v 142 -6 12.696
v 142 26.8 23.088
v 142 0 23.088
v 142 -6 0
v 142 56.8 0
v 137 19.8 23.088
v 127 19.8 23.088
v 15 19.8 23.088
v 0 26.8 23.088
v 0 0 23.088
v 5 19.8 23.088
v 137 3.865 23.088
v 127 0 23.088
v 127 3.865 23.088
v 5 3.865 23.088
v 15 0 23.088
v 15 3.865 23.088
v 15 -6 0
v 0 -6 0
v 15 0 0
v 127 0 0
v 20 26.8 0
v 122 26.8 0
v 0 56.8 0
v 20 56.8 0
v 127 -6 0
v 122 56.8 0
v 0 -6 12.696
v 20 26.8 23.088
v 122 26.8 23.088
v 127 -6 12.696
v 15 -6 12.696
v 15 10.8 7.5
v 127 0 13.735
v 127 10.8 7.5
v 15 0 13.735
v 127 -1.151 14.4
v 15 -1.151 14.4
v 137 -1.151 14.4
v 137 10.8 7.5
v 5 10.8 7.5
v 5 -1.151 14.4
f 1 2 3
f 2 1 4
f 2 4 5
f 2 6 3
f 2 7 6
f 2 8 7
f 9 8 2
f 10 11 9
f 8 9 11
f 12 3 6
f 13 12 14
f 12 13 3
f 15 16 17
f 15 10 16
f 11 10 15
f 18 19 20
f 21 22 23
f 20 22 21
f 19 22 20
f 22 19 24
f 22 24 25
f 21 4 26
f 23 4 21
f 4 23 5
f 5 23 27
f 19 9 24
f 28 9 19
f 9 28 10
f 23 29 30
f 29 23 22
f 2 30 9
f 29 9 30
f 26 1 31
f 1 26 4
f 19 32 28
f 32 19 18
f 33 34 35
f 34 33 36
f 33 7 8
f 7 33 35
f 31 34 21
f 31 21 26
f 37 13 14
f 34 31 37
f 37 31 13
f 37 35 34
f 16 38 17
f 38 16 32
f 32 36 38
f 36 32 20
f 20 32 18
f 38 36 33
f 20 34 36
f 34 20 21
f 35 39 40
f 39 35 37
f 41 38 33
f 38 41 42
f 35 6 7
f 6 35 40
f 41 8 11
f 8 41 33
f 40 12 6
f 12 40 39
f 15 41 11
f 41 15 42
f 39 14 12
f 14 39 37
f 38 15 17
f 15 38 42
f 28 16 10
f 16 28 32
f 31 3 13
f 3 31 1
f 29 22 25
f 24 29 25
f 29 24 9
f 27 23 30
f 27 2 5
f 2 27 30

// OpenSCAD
// Width of the phone when held horizontally (Layout view)
phone_width = 130;
// Thickness of phone, including case
phone_thickness = 11.8;

/* [Advanced] */
phone_angle = 60;
// How far the phone sinks into stand
phone_insert_depth = 18;
// How much wiggle room to allow between phone and stand
slide_gap = 2;
// How far back to extend the rear supports
support_extends = 30;
// How thick to make the rear supports
support_thickness = 20;

/* [Hidden] */
phone_insert_height = phone_insert_depth * sin(phone_angle); // how far into block we need to go to achieve depth
stand_base_height = 7.5;
stand_height = stand_base_height + phone_insert_height;


side_wall_thickness = 5;
front_wall_thickness = 6;
front_wall_width = 15;
back_wall_thickness = 7;

phone_hole_width = phone_width + slide_gap;
phone_hole_thickness = phone_thickness + slide_gap;
phone_hole_height = phone_insert_depth * 4; // will extend out top

block_width = phone_hole_width + (side_wall_thickness * 2);
block_depth = phone_hole_thickness + back_wall_thickness + front_wall_thickness;
block_height = stand_height;

extra = 1;



stand();

translate([0, block_depth, 0])
support();

translate([block_width - support_thickness, block_depth, 0])
support();


module stand(){
  difference(){
    union(){
      cube([block_width, block_depth, block_height]);

      translate([0, -front_wall_thickness, 0])
        cube([block_width, front_wall_thickness, block_height]);
    }

    phone_insert();

    front_angle_shave();

    front_viewer();
  }
}

module support(){
  rotate([90,0,90])
  linear_extrude(height=support_thickness)
  polygon(points=[
    [0,0],
    [support_extends,0],
    [0, stand_height]
      ]);
}

backstop_base = phone_insert_depth * sin(90 - phone_angle);

module phone_insert(){
  // the extra thickness added to the bottom of the back wall, because of angled phone insert
  translate([side_wall_thickness, block_depth - back_wall_thickness - backstop_base, stand_base_height])
    rotate([(phone_angle-90), 0, 0])
    translate([0, -phone_hole_thickness, 0]) // to rotate around back left bottom corner
    cube([phone_hole_width, phone_hole_thickness, phone_hole_height]);
}

module front_angle_shave(){
  extra_sink = 5;
  shave_y_offset = (block_height + extra_sink) * sin(90-phone_angle) / sin(phone_angle);
    translate([-extra, -shave_y_offset, -extra_sink ])
    rotate([phone_angle-90, 0, 0])
    translate([0, -block_depth, 0])
    cube([block_width + 2 * extra, block_depth, block_height*5]);
}

module front_viewer(){
  viewer_inset = block_height * sin(90-phone_angle) / sin(phone_angle);

  // hole that extends out in front of phone, at same angle
  translate([front_wall_width,  block_depth - back_wall_thickness - backstop_base, stand_base_height])
  rotate([phone_angle-90, 0, 0])
  translate([0, -block_depth, 0])
    cube([block_width - (front_wall_width * 2), block_depth, block_height * 2]);

  // hole in between front walls
  translate([front_wall_width, -(front_wall_thickness + extra), -extra])
    cube([block_width - (front_wall_width * 2), front_wall_thickness + extra, block_height + extra * 2]);
}
